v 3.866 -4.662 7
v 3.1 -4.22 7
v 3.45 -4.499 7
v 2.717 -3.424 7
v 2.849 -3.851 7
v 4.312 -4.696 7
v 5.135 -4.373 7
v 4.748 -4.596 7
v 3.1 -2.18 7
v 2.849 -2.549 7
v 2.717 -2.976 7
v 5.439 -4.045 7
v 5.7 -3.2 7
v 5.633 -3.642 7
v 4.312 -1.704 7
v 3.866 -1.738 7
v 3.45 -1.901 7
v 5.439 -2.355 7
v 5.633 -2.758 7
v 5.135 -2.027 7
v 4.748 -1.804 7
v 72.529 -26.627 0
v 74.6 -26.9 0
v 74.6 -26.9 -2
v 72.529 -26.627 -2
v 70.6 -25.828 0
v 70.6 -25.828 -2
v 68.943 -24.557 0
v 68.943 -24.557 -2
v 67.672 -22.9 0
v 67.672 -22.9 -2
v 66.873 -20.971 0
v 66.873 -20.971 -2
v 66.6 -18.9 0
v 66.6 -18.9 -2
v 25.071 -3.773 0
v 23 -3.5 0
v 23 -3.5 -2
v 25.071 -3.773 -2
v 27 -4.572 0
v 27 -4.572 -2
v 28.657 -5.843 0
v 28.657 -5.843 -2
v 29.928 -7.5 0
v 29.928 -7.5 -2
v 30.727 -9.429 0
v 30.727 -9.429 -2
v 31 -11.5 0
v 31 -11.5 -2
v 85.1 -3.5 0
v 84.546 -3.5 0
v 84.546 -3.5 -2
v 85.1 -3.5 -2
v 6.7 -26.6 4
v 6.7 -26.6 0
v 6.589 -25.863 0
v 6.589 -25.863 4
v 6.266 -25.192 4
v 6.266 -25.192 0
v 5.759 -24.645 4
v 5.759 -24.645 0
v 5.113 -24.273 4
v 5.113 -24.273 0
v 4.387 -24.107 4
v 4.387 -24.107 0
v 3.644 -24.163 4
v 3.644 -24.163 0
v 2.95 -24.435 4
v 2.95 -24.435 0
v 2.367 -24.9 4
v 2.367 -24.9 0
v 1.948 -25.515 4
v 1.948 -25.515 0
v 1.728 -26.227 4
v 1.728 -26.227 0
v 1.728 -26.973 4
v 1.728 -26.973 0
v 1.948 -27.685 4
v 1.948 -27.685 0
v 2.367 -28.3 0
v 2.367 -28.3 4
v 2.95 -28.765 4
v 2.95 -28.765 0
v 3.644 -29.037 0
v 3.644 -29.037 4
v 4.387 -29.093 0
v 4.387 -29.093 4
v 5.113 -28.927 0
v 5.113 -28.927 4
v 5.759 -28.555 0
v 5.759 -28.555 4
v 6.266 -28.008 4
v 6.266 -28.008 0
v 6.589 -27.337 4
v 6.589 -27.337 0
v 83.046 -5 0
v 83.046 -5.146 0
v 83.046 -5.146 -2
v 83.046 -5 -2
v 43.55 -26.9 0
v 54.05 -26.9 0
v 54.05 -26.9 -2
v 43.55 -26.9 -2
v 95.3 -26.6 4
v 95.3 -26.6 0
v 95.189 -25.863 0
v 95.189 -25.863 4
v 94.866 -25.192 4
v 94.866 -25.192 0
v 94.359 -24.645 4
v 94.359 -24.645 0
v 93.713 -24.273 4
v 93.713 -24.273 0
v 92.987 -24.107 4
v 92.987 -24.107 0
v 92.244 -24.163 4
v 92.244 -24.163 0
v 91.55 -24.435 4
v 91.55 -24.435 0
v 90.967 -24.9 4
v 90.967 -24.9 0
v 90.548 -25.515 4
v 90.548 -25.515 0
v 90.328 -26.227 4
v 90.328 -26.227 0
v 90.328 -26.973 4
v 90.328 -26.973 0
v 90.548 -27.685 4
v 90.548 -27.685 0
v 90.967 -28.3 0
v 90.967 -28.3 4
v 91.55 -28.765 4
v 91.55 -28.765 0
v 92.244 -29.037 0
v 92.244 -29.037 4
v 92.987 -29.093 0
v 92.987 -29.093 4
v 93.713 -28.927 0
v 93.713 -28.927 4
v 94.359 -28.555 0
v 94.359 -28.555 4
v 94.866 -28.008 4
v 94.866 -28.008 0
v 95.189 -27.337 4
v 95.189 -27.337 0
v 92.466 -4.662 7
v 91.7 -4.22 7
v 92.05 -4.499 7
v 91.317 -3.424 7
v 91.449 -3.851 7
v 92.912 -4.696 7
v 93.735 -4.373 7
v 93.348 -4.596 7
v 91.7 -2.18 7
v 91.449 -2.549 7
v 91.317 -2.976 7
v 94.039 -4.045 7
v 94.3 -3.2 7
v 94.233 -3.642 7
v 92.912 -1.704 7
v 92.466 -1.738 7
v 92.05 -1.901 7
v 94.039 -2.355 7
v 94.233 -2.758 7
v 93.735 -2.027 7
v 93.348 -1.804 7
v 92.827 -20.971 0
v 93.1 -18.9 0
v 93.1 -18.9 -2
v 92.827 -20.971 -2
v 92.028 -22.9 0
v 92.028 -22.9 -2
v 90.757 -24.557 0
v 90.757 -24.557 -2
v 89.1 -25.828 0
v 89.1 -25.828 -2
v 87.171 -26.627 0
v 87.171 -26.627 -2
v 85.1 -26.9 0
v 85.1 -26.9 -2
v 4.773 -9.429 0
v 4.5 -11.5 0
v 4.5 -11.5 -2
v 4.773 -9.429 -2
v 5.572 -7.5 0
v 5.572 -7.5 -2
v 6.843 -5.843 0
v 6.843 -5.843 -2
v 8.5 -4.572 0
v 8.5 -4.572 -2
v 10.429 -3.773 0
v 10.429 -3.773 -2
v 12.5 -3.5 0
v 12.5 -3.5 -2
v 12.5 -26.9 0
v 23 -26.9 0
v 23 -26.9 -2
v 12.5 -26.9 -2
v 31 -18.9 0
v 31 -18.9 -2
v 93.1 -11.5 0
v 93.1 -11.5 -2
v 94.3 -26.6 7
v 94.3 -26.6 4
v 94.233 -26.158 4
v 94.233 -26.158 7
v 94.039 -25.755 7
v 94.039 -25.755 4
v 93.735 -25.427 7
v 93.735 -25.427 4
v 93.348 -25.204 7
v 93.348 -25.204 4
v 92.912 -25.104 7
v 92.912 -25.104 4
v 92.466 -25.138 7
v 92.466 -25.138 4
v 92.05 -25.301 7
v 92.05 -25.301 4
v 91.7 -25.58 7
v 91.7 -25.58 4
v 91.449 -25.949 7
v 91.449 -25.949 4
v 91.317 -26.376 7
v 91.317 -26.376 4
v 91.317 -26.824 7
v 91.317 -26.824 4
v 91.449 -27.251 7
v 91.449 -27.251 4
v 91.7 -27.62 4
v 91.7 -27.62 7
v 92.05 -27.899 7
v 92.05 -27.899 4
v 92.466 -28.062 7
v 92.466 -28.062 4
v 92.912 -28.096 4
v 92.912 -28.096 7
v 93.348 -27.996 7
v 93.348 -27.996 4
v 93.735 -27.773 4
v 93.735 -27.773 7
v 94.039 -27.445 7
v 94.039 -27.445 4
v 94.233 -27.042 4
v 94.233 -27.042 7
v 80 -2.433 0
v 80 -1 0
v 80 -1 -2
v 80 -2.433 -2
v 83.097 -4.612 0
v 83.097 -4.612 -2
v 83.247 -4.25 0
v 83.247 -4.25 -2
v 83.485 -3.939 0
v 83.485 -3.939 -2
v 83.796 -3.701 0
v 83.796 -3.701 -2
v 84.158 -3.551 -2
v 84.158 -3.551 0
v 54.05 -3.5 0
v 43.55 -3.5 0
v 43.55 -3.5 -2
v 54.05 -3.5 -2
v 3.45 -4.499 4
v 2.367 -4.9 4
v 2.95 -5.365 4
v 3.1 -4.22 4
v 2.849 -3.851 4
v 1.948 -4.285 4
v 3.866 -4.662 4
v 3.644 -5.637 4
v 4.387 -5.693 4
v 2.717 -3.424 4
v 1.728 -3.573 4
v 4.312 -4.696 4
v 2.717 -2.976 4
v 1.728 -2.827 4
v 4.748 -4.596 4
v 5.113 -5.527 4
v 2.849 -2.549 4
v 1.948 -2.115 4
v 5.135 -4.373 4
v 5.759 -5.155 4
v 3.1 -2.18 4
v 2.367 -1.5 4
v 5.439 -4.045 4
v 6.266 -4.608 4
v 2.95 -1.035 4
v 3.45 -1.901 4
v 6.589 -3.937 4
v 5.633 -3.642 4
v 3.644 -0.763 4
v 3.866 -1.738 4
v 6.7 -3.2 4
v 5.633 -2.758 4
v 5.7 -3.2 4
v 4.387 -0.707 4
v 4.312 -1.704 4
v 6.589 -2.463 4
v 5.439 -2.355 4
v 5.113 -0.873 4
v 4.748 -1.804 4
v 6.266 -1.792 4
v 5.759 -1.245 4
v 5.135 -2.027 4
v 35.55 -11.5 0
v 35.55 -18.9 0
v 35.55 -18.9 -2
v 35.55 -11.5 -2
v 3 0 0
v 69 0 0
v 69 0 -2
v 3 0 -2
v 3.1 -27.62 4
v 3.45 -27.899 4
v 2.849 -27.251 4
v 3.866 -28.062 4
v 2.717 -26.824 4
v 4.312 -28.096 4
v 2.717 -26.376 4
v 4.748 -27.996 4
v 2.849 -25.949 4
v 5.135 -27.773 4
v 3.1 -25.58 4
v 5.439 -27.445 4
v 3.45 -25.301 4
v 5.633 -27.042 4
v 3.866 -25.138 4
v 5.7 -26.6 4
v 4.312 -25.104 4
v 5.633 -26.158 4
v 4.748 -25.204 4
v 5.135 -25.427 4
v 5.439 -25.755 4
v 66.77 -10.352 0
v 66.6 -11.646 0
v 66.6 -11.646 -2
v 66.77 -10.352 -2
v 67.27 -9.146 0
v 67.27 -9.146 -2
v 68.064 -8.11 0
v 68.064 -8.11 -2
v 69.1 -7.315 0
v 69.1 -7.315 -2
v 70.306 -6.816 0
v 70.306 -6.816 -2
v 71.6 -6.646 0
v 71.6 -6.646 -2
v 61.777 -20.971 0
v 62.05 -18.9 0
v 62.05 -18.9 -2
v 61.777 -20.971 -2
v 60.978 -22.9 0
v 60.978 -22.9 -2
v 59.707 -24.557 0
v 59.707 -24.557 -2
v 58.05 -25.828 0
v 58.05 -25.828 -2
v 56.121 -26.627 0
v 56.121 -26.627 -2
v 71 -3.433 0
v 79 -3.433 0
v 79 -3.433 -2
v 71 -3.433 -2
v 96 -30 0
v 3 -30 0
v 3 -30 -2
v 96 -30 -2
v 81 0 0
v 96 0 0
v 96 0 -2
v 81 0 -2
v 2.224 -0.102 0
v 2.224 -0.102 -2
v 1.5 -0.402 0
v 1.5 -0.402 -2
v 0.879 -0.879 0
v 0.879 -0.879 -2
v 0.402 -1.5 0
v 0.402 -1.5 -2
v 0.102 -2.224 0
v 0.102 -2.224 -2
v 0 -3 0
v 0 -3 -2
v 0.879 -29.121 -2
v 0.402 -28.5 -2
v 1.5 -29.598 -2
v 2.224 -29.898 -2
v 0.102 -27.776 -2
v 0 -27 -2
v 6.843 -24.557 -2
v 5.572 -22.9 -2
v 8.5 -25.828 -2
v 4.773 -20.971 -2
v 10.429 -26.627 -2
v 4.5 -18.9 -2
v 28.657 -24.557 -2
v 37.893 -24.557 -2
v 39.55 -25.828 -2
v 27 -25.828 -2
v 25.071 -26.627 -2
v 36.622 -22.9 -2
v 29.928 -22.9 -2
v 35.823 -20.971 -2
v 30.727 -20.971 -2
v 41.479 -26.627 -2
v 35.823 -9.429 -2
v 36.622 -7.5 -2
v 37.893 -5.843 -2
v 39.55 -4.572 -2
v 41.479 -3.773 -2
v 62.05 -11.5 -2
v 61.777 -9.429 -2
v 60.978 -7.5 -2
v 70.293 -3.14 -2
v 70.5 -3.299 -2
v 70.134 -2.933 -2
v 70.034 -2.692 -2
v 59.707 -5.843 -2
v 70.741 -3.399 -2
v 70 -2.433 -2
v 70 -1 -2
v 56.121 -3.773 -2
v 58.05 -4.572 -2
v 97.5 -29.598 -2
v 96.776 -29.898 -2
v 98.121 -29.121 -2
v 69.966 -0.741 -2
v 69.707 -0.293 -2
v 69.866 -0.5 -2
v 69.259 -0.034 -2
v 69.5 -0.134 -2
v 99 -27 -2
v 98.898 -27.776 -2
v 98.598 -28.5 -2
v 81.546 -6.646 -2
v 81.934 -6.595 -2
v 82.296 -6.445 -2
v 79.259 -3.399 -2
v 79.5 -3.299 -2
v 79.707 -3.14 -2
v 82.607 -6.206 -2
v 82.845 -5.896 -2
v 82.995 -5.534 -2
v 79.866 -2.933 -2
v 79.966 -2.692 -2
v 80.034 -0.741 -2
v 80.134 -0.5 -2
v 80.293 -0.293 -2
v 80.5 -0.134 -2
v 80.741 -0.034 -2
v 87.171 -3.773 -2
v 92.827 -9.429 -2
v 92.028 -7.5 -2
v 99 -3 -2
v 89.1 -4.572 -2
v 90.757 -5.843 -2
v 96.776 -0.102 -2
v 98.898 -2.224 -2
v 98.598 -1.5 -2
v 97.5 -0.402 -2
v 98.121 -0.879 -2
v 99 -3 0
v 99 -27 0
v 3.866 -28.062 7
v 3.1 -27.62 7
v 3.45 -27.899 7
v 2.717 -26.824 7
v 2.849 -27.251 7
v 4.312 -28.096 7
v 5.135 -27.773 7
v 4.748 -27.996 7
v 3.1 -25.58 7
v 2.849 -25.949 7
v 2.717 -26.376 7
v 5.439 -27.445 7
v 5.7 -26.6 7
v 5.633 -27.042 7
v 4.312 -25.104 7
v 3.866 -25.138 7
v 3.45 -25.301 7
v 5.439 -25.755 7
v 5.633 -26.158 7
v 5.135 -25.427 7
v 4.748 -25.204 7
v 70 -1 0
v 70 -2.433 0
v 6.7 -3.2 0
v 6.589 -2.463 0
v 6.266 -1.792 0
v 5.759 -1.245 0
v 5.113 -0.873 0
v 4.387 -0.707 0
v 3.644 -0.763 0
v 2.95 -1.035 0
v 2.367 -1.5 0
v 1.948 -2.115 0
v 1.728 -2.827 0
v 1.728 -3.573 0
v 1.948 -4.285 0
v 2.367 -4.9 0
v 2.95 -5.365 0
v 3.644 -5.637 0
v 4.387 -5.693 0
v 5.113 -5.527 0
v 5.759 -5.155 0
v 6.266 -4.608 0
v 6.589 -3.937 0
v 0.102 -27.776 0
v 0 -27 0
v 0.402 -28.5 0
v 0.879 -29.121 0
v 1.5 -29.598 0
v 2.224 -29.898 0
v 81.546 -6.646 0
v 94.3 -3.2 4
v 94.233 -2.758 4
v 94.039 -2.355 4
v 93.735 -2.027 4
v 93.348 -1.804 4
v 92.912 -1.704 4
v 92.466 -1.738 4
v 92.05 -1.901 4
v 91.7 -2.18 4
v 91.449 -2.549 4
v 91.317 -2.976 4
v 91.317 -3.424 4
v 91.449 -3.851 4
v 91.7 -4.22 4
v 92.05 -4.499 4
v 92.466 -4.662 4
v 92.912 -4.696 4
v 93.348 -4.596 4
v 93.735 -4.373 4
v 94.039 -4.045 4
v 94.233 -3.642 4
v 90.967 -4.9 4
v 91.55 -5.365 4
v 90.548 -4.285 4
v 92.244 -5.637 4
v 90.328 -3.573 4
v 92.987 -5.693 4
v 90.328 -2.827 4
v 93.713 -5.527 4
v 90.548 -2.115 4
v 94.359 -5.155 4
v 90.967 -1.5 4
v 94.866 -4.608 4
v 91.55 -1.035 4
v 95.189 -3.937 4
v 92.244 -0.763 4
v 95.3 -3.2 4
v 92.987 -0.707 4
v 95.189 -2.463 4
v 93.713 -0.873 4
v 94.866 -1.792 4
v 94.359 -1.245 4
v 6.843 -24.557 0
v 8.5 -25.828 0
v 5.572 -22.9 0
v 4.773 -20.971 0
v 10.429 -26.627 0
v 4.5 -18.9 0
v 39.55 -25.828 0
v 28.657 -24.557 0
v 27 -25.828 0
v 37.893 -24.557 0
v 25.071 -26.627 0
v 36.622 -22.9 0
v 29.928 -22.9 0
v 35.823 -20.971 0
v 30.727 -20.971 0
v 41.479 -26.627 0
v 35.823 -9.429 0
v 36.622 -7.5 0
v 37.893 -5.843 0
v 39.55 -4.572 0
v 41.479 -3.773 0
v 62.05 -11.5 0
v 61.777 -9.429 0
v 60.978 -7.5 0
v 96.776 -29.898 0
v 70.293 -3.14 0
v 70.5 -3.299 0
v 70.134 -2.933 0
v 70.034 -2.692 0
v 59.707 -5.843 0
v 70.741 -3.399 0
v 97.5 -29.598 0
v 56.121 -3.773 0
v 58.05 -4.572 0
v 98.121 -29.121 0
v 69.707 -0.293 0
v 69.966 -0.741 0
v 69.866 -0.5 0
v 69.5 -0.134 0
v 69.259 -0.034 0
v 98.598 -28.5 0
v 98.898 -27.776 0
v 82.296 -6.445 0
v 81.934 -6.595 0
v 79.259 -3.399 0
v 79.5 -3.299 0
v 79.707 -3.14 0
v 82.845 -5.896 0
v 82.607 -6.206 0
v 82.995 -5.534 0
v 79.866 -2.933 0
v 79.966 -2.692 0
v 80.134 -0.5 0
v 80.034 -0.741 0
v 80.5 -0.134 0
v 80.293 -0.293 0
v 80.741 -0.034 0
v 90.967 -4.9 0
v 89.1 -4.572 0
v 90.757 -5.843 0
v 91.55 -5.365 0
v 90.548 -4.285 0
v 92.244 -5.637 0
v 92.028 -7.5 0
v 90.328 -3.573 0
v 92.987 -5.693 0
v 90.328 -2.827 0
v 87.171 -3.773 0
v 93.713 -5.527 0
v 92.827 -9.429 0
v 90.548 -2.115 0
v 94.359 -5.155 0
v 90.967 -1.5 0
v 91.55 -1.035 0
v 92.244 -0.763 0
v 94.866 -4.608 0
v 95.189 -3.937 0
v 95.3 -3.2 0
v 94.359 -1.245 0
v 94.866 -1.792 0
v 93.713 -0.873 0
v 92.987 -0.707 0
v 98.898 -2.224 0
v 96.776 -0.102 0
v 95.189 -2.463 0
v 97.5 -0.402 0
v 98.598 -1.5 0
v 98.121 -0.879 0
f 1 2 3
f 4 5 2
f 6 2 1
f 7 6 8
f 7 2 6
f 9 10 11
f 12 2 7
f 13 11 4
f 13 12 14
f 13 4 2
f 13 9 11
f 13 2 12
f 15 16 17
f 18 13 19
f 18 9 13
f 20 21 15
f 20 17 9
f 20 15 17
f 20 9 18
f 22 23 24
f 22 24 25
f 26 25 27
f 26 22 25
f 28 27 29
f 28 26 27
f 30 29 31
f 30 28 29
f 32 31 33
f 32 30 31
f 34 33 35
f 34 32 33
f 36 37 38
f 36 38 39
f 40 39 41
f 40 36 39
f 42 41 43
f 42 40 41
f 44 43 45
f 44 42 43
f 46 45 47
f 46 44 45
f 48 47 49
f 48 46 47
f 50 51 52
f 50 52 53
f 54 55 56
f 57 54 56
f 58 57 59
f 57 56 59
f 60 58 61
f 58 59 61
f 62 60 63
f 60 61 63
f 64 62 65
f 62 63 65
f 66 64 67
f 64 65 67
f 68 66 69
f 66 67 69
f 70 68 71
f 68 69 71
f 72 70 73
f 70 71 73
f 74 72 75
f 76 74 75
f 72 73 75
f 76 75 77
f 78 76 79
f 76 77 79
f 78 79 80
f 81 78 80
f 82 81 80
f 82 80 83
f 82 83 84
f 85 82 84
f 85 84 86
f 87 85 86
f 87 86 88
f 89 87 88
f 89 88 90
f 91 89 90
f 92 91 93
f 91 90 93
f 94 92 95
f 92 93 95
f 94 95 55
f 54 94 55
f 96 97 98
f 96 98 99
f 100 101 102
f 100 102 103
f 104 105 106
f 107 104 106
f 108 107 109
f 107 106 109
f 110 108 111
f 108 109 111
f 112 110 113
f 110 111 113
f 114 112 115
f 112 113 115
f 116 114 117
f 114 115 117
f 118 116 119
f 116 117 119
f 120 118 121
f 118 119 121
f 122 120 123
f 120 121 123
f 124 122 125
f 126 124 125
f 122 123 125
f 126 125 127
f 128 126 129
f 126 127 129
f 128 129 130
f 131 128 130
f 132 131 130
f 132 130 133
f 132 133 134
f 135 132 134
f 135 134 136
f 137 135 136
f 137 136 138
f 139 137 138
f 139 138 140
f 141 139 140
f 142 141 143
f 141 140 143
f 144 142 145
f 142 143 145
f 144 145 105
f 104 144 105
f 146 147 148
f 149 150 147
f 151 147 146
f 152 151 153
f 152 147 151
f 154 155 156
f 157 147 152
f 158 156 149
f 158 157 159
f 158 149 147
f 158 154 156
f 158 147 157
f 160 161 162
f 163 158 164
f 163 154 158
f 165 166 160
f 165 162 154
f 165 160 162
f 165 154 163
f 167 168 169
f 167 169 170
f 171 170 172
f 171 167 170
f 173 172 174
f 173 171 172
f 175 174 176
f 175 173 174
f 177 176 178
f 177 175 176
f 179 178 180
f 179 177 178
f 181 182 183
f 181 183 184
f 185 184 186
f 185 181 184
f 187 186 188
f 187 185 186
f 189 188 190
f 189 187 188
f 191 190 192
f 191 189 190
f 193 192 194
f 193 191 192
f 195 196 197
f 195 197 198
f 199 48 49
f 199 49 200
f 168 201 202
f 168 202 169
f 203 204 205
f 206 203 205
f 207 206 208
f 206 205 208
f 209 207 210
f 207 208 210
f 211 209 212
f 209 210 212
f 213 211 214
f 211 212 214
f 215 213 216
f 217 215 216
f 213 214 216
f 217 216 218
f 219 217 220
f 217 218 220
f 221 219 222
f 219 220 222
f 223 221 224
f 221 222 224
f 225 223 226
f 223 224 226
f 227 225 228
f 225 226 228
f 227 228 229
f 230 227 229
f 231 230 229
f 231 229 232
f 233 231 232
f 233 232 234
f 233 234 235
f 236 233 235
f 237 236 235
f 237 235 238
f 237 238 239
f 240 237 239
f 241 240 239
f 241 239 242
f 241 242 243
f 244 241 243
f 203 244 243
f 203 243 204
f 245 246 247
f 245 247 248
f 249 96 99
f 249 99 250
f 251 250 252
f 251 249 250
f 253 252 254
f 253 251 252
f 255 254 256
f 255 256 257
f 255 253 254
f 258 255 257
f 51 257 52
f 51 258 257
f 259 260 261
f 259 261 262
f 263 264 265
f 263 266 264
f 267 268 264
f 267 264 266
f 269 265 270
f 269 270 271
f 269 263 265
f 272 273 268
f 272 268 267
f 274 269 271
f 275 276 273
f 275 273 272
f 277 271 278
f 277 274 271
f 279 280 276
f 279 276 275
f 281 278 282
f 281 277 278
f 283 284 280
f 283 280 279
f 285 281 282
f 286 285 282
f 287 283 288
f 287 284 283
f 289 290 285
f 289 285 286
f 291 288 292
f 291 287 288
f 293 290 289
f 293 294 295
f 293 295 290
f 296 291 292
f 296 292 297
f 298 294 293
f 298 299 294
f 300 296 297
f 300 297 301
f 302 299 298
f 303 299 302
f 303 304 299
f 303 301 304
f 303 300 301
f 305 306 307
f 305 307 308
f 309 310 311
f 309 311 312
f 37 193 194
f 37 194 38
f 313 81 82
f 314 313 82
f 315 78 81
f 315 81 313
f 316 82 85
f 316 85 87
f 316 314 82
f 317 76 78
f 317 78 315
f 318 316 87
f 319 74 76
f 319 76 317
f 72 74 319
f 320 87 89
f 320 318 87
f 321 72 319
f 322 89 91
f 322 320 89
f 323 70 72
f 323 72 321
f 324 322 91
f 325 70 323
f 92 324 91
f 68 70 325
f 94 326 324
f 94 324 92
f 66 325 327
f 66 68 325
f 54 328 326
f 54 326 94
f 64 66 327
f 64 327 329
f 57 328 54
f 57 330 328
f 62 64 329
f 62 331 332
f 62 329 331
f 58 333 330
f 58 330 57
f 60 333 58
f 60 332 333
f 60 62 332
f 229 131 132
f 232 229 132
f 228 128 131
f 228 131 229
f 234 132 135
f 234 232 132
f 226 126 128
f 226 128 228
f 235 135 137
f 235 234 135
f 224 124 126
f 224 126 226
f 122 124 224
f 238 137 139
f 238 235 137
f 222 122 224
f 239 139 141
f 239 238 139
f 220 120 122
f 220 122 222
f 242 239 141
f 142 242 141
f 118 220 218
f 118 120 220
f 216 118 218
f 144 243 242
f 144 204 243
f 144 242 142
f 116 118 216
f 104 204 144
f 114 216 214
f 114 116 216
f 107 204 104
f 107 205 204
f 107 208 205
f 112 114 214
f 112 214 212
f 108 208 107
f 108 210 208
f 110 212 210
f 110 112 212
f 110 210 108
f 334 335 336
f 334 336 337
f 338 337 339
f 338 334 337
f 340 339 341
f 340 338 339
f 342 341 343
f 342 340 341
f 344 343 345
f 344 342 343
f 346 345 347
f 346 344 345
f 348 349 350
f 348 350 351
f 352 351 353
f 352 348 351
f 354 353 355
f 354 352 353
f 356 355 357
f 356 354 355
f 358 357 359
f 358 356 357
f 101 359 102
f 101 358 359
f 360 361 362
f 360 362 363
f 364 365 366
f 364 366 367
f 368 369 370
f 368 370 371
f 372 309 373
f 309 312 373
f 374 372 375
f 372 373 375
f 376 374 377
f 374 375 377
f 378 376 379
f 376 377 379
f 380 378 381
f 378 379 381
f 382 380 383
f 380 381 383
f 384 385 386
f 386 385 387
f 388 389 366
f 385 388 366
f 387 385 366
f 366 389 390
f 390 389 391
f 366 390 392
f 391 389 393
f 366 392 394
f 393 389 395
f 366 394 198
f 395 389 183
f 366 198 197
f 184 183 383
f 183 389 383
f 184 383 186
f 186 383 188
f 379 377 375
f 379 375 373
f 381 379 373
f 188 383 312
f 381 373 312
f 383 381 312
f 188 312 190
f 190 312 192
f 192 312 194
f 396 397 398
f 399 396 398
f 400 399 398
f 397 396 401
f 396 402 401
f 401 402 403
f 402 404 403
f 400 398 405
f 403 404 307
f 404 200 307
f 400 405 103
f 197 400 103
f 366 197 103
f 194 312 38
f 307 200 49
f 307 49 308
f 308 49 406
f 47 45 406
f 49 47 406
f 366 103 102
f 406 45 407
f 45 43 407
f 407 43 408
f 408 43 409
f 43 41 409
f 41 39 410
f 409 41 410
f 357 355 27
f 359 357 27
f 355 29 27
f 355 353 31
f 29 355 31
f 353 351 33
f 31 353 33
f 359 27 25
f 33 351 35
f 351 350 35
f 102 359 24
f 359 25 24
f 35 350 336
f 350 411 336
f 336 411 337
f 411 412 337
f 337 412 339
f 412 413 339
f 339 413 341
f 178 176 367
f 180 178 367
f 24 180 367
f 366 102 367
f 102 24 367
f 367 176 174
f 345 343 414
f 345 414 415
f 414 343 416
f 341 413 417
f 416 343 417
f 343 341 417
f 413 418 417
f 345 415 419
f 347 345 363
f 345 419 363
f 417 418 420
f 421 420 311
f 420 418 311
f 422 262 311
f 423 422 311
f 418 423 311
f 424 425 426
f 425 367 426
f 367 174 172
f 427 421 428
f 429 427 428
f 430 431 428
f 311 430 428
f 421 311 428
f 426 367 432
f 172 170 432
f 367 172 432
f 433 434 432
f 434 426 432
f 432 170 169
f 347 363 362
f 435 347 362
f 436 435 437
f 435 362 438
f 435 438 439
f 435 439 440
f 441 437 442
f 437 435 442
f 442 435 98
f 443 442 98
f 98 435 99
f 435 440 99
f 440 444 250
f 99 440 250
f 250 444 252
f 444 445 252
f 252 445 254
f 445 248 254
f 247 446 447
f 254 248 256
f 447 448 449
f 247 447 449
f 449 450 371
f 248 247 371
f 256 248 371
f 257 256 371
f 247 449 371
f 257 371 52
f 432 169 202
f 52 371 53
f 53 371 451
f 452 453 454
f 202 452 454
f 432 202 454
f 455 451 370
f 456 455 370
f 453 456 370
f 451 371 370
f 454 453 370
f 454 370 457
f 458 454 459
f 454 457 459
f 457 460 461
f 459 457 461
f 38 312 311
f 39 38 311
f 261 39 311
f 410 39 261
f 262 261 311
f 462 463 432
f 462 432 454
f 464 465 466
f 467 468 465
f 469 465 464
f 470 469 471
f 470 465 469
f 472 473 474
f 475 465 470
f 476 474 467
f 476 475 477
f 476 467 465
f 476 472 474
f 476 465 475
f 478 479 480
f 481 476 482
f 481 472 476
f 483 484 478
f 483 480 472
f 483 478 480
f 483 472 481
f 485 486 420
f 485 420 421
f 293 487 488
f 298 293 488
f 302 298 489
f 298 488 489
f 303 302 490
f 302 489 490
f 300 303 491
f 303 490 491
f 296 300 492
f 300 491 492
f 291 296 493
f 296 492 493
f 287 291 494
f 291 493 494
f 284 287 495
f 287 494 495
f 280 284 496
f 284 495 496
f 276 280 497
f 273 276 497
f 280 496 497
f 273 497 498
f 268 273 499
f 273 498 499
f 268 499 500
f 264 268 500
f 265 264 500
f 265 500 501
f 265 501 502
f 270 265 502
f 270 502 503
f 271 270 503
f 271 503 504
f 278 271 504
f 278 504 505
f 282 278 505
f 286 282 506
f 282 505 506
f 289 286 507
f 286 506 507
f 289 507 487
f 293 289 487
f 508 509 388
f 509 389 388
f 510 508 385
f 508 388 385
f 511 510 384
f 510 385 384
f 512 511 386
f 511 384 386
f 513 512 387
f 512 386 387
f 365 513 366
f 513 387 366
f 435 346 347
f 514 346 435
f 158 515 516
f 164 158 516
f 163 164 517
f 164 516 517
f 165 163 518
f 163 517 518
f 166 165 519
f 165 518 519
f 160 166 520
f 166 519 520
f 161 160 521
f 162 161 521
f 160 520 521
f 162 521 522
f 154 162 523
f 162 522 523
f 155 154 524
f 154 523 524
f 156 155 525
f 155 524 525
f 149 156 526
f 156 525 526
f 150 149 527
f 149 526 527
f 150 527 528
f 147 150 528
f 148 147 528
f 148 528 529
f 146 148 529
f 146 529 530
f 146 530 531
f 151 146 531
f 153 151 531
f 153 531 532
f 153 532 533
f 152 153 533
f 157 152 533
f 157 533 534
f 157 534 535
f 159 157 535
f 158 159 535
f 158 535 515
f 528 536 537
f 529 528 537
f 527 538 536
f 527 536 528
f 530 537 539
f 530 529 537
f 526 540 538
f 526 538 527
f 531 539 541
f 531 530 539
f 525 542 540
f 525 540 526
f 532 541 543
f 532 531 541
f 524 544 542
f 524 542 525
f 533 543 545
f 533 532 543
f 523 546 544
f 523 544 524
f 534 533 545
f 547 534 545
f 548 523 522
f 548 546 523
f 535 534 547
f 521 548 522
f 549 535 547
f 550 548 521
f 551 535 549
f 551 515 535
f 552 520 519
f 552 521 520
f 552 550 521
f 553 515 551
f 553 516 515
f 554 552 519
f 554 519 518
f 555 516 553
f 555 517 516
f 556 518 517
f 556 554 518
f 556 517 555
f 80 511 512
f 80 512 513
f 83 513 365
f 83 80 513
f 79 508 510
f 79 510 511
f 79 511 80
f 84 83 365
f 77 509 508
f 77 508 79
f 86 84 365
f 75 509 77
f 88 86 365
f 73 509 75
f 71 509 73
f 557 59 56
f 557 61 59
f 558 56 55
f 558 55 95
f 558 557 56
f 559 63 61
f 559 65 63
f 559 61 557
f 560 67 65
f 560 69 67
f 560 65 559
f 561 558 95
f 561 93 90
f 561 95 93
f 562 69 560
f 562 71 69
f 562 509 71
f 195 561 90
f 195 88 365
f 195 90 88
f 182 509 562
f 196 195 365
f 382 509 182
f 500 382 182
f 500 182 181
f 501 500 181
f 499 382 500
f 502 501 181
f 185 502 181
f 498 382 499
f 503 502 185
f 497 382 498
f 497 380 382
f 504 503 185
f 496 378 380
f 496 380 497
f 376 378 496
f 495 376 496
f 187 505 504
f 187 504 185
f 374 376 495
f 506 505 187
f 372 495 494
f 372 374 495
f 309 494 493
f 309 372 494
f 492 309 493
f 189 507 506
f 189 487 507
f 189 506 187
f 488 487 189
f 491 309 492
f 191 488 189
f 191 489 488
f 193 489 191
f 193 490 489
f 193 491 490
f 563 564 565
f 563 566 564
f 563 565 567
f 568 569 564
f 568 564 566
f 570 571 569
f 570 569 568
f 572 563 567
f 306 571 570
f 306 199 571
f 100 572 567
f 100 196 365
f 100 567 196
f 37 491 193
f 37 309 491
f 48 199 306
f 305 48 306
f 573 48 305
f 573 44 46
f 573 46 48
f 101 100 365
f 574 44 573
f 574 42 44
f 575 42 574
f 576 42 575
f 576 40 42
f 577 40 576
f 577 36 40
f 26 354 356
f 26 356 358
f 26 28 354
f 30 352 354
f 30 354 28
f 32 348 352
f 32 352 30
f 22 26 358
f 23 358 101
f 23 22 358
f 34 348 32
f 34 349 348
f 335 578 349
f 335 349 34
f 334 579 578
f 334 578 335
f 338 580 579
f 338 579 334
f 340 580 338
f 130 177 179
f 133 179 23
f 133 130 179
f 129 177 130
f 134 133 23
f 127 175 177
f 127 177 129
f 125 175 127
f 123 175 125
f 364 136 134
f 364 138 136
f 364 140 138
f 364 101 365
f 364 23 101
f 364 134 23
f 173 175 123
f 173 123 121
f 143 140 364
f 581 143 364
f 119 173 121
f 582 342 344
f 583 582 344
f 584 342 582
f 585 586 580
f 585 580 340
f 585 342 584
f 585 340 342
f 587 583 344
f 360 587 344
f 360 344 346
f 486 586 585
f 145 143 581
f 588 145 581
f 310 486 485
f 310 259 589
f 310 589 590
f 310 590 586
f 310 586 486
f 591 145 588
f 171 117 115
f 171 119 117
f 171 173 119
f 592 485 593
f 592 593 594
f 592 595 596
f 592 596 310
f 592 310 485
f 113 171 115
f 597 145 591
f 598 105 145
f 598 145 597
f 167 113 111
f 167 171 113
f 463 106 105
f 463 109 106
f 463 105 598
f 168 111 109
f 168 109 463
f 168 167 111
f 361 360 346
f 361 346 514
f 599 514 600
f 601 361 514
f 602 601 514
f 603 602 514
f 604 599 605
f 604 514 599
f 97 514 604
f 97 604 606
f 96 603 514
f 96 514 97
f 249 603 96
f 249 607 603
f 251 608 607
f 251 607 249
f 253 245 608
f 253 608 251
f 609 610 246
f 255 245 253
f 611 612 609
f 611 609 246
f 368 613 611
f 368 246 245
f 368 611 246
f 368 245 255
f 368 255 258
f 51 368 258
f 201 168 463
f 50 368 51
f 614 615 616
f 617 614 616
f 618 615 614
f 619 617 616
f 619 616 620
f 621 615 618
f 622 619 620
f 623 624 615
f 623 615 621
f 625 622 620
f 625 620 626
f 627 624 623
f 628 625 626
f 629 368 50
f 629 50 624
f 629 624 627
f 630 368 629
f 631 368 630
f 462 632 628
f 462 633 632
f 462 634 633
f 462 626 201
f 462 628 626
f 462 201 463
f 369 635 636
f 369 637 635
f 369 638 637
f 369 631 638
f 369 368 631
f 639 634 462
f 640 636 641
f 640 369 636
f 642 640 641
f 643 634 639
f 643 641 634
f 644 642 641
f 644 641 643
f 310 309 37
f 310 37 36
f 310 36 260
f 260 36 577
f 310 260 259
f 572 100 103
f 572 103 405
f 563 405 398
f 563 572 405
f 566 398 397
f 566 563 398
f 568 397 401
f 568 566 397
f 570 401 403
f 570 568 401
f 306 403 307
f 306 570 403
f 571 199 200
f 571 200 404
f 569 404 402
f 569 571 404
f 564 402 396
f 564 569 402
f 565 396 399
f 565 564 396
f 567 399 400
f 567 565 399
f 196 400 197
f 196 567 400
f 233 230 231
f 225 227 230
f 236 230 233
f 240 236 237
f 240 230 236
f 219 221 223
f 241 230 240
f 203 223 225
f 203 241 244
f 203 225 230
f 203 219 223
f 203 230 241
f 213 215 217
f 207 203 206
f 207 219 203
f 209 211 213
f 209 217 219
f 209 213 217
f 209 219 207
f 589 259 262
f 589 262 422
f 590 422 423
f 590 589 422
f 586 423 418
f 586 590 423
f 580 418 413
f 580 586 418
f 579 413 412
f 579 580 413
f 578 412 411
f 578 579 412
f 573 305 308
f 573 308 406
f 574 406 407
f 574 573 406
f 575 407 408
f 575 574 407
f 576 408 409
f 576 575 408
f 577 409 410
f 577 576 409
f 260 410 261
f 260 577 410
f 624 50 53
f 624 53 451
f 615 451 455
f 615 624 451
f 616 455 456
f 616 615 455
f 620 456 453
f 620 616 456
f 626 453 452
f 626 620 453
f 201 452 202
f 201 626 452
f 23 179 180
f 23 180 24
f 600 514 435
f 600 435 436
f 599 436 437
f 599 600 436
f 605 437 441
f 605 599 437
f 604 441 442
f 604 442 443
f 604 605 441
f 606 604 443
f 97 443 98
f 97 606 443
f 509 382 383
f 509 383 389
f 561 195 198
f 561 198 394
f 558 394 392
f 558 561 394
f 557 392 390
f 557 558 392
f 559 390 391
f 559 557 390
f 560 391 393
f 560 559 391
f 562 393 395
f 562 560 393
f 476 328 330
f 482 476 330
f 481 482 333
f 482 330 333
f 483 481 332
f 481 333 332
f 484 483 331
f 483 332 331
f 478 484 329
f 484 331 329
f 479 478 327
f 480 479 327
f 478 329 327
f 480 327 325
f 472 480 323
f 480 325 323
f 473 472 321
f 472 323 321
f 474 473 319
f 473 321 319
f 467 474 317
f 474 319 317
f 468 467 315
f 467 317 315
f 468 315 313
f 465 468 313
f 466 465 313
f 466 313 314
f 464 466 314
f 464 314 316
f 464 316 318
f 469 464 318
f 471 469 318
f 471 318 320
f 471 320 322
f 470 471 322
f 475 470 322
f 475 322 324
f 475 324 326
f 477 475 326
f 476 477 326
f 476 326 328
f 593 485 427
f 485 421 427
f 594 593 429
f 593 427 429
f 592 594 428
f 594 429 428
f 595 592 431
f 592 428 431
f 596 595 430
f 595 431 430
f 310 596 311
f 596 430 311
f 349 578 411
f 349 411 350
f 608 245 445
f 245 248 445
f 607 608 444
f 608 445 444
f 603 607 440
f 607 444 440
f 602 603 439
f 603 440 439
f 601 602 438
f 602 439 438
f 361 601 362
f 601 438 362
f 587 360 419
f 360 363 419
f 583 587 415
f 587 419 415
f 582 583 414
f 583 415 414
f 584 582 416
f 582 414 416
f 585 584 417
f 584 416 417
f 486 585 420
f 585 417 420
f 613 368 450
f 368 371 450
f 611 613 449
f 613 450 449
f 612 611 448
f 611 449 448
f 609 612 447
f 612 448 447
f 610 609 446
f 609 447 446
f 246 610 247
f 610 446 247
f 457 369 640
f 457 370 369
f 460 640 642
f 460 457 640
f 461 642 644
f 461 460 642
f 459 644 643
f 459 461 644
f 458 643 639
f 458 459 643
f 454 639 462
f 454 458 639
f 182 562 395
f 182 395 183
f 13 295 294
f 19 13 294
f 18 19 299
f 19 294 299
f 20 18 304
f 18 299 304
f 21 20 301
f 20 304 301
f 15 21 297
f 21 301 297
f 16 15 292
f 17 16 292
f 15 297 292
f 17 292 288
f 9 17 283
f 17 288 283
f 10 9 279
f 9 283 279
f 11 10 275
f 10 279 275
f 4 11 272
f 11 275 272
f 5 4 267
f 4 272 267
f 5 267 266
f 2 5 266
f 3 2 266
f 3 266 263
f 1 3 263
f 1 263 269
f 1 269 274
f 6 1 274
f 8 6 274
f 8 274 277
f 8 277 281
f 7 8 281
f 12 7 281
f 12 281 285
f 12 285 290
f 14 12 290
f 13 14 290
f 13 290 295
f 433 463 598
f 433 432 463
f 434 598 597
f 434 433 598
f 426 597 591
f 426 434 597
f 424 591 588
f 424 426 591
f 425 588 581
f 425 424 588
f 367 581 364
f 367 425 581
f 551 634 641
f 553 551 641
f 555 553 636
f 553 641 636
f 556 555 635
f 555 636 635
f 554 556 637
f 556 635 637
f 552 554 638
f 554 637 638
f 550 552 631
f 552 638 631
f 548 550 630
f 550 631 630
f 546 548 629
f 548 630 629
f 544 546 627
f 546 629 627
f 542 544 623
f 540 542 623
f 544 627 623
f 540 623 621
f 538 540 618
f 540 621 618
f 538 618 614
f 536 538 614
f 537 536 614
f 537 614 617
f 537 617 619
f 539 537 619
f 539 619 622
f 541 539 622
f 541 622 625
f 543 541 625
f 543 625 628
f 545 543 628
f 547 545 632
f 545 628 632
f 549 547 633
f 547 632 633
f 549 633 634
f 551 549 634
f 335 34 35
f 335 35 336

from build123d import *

# Parameters (mm, degrees)
F1_DEPTH = 2
F3_R     = 3
F4_R     = 1
F2_R     = 2.5
F2_R_2   = 1.5
F5_DEPTH = 4
F6_DEPTH = 7


with BuildPart() as f1:
    # F0 (on Top) → F1 (new body)
    with BuildSketch(Plane.XY):
        Polygon((80, -3.433377482), (70, -3.433377482), (70, 0), (0, 0), (0, -30), (99, -30), (99, 0), (80, 0), align=None)
        with BuildLine():
            ThreePointArc((4.5, -11.5), (6.8431457505, -5.8431457505), (12.5, -3.5))
            Line((12.5, -3.5), (23, -3.5))
            ThreePointArc((23, -3.5), (28.6568542495, -5.8431457505), (31, -11.5))
            Line((31, -11.5), (31, -18.9))
            ThreePointArc((31, -18.9), (28.6568542495, -24.5568542495), (23, -26.9))
            Line((23, -26.9), (12.5, -26.9))
            ThreePointArc((12.5, -26.9), (6.8431457505, -24.5568542495), (4.5, -18.9))
            Line((4.5, -18.9), (4.5, -11.5))
        make_face(mode=Mode.SUBTRACT)
        with BuildLine():
            ThreePointArc((35.55, -11.5), (37.8931457505, -5.8431457505), (43.55, -3.5))
            Line((43.55, -3.5), (54.05, -3.5))
            ThreePointArc((54.05, -3.5), (59.7068542495, -5.8431457505), (62.05, -11.5))
            Line((62.05, -11.5), (62.05, -18.9))
            ThreePointArc((62.05, -18.9), (59.7068542495, -24.5568542495), (54.05, -26.9))
            Line((54.05, -26.9), (43.55, -26.9))
            ThreePointArc((43.55, -26.9), (37.8931457505, -24.5568542495), (35.55, -18.9))
            Line((35.55, -18.9), (35.55, -11.5))
        make_face(mode=Mode.SUBTRACT)
        with BuildLine():
            Line((84.5458595753, -3.5), (85.1, -3.5))
            ThreePointArc((85.1, -3.5), (90.7568542495, -5.8431457505), (93.1, -11.5))
            Line((93.1, -11.5), (93.1, -18.9))
            ThreePointArc((93.1, -18.9), (90.7568542495, -24.5568542495), (85.1, -26.9))
            Line((85.1, -26.9), (74.6, -26.9))
            ThreePointArc((74.6, -26.9), (68.9431457505, -24.5568542495), (66.6, -18.9))
            Line((66.6, -18.9), (66.6, -11.6456231289))
            ThreePointArc((66.6, -11.6456231289), (68.0644660941, -8.1100892229), (71.6, -6.6456231289))
            Line((71.6, -6.6456231289), (81.5458595753, -6.6456231289))
            ThreePointArc((81.5458595753, -6.6456231289), (82.6065197471, -6.2062833006), (83.0458595753, -5.1456231289))
            Line((83.0458595753, -5.1456231289), (83.0458595753, -5))
            ThreePointArc((83.0458595753, -5), (83.4851994035, -3.9393398282), (84.5458595753, -3.5))
        make_face(mode=Mode.SUBTRACT)
    extrude(amount=-F1_DEPTH)

    # F3
    f3_edges = [f1.edges().sort_by_distance(p)[0] for p in [
        (0, 0, -1),
        (0, -30, -1),
        (99, -30, -1),
        (99, 0, -1),
    ]]
    fillet(f3_edges, radius=F3_R)

    # F4
    f4_edges = [f1.edges().sort_by_distance(p)[0] for p in [
        (70, -3.433377, -1),
        (80, -3.433377, -1),
        (70, 0, -1),
        (80, 0, -1),
    ]]
    fillet(f4_edges, radius=F4_R)

    # F2 (on face) → F5 (join)
    with BuildSketch(Plane.XY):
        with Locations((4.2, -3.2)):
            Circle(F2_R)
        with Locations((4.2, -3.2)):
            Circle(F2_R_2, mode=Mode.SUBTRACT)
        with Locations((92.8, -3.2)):
            Circle(F2_R)
        with Locations((92.8, -3.2)):
            Circle(F2_R_2, mode=Mode.SUBTRACT)
        with Locations((92.8, -26.6)):
            Circle(F2_R)
        with Locations((92.8, -26.6)):
            Circle(F2_R_2, mode=Mode.SUBTRACT)
        with Locations((4.2, -26.6)):
            Circle(F2_R)
        with Locations((4.2, -26.6)):
            Circle(F2_R_2, mode=Mode.SUBTRACT)
    extrude(amount=F5_DEPTH)

    # F6 (add): faces of the model
    f6_faces = [f1.faces().sort_by_distance(p)[0] for p in [
        (4.2, -3.2, 0),
        (4.2, -26.6, 0),
        (92.8, -3.2, 0),
        (92.8, -26.6, 0),
    ]]
    extrude(f6_faces, amount=F6_DEPTH)


solid = f1.part
